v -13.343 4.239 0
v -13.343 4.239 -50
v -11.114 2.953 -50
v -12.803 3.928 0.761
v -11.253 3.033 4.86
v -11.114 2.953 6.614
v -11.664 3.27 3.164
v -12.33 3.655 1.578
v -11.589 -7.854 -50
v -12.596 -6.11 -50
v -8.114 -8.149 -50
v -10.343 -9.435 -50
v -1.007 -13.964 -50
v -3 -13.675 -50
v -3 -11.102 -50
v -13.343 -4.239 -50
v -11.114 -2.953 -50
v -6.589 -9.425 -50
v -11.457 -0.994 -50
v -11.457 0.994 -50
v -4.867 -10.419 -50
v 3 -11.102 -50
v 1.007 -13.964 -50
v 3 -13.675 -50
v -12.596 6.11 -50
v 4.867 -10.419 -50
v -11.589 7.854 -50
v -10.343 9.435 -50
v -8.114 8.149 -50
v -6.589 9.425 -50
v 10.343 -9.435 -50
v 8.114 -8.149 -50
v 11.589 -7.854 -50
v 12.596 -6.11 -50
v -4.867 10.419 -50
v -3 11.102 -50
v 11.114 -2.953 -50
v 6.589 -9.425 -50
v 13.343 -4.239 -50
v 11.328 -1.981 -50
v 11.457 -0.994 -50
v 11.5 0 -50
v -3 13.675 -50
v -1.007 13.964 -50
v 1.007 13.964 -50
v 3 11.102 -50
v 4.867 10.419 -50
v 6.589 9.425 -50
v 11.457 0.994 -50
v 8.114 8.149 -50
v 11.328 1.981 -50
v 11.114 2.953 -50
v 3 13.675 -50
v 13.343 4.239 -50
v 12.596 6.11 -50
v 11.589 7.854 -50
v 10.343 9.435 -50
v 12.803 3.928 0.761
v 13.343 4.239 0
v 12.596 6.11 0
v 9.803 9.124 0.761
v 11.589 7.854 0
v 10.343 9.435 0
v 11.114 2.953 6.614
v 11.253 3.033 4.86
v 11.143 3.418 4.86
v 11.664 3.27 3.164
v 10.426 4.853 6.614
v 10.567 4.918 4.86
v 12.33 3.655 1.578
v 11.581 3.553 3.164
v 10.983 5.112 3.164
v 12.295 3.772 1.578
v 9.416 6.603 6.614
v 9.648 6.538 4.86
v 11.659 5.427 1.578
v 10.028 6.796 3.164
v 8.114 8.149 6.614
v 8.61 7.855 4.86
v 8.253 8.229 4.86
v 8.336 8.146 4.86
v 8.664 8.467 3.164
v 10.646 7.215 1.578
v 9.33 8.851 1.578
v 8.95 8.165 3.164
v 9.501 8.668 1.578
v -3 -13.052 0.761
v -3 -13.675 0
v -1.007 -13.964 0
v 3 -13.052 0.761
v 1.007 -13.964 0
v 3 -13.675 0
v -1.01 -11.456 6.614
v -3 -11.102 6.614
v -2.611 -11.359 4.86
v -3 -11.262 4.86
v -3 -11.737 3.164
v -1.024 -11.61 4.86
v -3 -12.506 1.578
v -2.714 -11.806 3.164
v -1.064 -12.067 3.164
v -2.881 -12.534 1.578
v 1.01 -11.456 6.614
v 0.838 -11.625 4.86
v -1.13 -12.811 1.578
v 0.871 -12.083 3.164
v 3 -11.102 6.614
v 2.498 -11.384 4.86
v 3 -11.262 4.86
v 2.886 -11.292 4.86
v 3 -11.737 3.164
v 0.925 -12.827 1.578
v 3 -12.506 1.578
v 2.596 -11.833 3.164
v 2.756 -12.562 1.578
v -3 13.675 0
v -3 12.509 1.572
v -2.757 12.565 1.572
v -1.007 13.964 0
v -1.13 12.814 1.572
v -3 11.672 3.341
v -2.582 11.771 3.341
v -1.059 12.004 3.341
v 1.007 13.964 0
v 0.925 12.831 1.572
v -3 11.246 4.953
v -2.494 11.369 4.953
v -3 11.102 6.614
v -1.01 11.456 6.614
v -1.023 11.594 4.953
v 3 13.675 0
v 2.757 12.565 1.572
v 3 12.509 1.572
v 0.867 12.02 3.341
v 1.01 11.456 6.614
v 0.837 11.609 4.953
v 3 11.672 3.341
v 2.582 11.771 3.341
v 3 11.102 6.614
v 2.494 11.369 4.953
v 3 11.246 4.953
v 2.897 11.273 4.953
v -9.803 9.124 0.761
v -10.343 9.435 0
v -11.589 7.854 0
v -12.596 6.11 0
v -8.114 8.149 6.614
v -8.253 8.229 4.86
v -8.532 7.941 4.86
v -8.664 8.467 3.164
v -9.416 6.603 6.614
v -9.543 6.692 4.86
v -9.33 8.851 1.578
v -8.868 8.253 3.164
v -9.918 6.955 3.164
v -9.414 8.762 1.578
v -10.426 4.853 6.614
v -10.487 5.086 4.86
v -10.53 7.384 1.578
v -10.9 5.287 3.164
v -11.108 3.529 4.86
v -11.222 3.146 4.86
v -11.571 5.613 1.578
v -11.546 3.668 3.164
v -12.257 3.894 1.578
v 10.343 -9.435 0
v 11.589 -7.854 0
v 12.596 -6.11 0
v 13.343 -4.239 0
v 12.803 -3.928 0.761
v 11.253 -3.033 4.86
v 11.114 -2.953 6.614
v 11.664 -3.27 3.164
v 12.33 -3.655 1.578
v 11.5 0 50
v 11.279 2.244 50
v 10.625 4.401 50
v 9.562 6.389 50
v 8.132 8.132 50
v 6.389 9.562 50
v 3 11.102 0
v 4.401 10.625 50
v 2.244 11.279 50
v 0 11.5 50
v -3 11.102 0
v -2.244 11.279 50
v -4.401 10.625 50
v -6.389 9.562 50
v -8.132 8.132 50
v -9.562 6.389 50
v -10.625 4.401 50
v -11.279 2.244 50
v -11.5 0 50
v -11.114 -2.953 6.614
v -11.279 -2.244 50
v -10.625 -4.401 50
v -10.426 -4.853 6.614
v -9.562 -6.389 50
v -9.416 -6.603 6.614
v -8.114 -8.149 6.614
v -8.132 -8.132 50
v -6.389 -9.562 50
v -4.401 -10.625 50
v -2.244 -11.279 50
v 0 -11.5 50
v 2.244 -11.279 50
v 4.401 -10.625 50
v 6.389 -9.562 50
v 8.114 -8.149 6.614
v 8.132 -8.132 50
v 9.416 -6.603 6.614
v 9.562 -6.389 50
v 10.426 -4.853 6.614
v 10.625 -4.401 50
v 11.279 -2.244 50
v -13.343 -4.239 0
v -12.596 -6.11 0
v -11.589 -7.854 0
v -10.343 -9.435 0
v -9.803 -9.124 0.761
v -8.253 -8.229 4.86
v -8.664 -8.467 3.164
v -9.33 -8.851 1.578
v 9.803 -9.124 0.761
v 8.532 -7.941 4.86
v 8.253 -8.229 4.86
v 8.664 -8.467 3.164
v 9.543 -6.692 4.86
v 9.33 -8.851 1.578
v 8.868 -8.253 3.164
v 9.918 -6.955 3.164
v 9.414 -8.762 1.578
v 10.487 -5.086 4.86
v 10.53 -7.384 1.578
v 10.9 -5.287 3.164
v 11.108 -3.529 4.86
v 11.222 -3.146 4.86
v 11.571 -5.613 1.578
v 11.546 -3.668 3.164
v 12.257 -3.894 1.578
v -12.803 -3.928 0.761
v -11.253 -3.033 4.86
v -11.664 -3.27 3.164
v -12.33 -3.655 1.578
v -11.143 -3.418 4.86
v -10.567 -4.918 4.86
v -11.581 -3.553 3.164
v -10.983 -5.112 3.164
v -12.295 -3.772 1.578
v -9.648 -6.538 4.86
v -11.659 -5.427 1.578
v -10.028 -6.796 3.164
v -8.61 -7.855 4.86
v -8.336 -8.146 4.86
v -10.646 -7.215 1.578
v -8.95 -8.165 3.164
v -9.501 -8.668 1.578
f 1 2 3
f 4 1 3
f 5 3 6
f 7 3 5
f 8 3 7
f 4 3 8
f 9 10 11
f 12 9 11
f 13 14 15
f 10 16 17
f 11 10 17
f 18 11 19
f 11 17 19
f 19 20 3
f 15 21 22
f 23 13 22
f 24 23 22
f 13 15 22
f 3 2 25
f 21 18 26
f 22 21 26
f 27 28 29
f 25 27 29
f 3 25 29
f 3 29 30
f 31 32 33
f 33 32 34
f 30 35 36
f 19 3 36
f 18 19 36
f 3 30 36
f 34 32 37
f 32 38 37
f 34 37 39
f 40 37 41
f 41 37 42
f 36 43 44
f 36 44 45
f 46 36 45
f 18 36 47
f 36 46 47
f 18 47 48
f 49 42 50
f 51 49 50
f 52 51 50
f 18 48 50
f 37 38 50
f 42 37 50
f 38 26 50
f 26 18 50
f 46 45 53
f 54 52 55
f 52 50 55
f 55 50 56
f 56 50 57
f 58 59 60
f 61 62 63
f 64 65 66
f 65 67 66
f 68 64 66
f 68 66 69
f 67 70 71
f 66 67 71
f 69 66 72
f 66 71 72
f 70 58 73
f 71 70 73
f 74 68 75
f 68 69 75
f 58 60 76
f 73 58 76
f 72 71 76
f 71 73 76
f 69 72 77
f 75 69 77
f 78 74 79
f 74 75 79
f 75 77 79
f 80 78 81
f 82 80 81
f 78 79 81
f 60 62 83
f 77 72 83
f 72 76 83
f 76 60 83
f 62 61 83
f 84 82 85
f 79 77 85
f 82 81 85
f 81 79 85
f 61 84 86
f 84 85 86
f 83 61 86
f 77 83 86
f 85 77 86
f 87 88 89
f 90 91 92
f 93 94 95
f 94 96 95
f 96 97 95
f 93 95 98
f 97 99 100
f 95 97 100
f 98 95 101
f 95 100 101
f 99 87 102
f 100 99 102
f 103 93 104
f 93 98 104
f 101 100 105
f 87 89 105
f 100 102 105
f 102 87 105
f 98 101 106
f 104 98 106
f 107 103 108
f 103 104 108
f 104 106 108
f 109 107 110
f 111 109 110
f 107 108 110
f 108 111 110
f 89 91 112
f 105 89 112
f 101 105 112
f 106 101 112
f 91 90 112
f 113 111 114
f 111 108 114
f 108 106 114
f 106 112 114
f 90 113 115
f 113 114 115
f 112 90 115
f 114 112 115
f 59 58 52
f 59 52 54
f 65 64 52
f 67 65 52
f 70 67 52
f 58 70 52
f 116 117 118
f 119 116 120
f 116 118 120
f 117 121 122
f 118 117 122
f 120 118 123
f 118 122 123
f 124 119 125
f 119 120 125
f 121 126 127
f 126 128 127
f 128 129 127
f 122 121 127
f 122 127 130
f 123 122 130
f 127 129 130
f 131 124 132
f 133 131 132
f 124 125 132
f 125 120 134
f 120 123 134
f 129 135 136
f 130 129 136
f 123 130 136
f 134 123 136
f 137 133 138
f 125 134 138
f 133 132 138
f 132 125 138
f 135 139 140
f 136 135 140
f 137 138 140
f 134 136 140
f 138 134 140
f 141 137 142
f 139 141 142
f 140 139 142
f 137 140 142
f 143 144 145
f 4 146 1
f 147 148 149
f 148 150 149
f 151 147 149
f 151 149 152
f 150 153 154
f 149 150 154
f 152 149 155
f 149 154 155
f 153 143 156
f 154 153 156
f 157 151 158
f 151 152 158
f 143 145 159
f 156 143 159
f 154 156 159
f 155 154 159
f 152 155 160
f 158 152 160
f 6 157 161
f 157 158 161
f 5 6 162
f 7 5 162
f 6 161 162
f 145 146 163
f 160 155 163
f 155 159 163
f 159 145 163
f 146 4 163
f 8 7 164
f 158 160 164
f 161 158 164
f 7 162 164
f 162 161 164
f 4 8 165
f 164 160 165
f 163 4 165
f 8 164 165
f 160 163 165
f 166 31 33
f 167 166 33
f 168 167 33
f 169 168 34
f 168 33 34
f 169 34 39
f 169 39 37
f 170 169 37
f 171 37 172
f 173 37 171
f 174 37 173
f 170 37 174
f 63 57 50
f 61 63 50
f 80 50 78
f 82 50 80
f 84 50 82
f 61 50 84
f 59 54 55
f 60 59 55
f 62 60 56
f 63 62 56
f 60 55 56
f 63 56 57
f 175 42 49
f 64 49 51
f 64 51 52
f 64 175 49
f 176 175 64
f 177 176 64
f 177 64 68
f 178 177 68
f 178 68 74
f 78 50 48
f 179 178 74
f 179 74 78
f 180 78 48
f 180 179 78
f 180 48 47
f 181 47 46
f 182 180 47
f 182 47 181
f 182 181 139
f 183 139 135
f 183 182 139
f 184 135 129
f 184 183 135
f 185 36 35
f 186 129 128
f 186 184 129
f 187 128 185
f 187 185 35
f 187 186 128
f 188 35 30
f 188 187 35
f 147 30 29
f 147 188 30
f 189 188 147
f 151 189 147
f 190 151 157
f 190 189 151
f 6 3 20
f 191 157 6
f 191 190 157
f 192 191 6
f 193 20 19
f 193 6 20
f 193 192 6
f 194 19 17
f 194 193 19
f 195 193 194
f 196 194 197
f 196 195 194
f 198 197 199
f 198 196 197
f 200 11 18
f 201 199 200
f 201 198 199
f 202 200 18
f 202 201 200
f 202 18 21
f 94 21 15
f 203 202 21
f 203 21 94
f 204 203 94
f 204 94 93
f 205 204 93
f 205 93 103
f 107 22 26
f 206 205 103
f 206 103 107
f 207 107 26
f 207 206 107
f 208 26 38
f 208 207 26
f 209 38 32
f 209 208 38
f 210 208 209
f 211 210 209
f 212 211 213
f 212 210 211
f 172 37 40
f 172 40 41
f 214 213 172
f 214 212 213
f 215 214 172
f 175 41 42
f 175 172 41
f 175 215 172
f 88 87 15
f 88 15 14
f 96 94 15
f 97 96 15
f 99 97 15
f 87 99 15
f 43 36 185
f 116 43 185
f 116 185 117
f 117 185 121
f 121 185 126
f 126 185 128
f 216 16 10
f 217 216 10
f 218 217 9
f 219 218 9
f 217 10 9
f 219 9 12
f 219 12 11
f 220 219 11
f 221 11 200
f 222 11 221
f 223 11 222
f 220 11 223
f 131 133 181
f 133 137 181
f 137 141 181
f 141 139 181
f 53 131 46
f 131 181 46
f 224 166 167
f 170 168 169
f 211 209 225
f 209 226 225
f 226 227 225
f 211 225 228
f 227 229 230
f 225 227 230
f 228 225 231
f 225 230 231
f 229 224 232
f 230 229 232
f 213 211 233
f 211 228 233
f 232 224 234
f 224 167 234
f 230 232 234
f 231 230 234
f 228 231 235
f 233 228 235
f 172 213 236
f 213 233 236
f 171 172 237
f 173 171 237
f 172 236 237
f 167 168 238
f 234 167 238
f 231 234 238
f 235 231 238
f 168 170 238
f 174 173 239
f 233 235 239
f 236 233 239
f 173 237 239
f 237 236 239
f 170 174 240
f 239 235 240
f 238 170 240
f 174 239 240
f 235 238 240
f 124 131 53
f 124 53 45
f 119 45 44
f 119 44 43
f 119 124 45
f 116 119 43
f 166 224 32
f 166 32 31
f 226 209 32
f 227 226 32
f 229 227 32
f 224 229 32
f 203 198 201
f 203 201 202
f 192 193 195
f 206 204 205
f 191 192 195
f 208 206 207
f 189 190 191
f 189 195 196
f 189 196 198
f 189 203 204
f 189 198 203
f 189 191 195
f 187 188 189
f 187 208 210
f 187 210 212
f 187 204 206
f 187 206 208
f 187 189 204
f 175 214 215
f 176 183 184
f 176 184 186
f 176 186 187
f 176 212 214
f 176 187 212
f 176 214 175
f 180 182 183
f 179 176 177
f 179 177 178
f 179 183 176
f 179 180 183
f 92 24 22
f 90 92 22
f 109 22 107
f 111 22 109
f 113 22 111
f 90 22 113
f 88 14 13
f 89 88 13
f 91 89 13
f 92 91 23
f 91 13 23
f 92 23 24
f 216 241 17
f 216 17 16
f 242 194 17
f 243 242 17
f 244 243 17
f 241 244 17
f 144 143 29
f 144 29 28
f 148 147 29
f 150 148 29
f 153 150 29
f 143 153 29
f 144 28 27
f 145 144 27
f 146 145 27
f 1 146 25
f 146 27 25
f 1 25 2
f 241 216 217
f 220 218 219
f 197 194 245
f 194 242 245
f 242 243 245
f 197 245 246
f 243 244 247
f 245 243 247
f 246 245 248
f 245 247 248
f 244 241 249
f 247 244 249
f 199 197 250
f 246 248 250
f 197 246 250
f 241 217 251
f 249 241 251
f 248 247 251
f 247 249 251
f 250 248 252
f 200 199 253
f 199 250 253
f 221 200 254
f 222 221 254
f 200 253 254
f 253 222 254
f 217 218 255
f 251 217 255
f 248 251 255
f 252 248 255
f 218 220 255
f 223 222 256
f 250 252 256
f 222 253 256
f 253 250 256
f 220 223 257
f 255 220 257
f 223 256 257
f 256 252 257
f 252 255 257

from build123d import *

# Parameters (mm, degrees)
SKETCH1_R           = 11.5
SHAFT_DEPTH         = 50
BOSS_EXTRUDE2_DEPTH = 50
FILLET1_R           = 10
CIRPATTERN1_START   = -50
CIRPATTERN1_DEPTH   = 56.614378378


with BuildPart() as part:
    # Sketch1 → Shaft (new, symmetric)
    with BuildSketch(Plane.XY):
        Circle(SKETCH1_R)
    extrude(amount=SHAFT_DEPTH, both=True)

    # Sketch2 → Boss-Extrude2 (add)
    with BuildSketch(Plane.XY):
        with BuildLine():
            Line((3, 11.101801656), (3, 13.674794331))
            ThreePointArc((3, 13.674794331), (0, 14), (-3, 13.674794331))
            Line((-3, 13.674794331), (-3, 11.101801656))
            ThreePointArc((-3, 11.101801656), (0, 11.5), (3, 11.101801656))
        make_face()
    extrude(amount=-BOSS_EXTRUDE2_DEPTH)

    # Fillet1
    # the kernel refuses this fillet: 10 mm, written as the material it adds along each edge
    with BuildSketch(Plane(origin=(0, 0, 0), x_dir=(-0.9914186895468253, -0.13072483320798547, 0), z_dir=(0.13072483320798547, -0.9914186895468253, 0))) as fillet1_piece_1_section:
        with BuildLine():
            CenterArc((21.5, -6.614378278), FILLET1_R, 138.590377891, 41.409622109)
            Line((14, 0), (13.85, 0.132287566))
            ThreePointArc((13.85, 0.132287566), (12.75, 0.2), (11.5, 0.2))
            Line((11.5, 0.2), (11.3, 0))
            Line((11.3, 0), (11.3, -6.614378278))
            Line((11.3, -6.614378278), (11.5, -6.614378278))
        make_face()
    fillet1_piece_1 = revolve(axis=Axis((0, 0, 0), (0, 0, -1)), revolution_arc=195.022959301, mode=Mode.PRIVATE)
    fillet1_piece_1 = split(fillet1_piece_1, bisect_by=Plane(origin=(-3, 0, 0), z_dir=(1, 0, 0)), keep=Keep.TOP, mode=Mode.PRIVATE)
    fillet1_piece_1 = split(fillet1_piece_1, bisect_by=Plane(origin=(3, 0, 0), z_dir=(-1, 0, 0)), keep=Keep.TOP, mode=Mode.PRIVATE)
    add(fillet1_piece_1)

    # CirPattern1: read off the stored shape, not the designer's step
    # CirPattern1 outline → CirPattern1 (add)
    with BuildSketch(Plane.XY.offset(CIRPATTERN1_START)):
        with BuildLine():
            Line((11.114442262, 2.952824616), (13.342719282, 4.239320954))
            ThreePointArc((13.342719282, 4.239320954), (12.124355653, 7), (10.342719282, 9.435473377))
            Line((10.342719282, 9.435473377), (8.114442262, 8.148977039))
            ThreePointArc((8.114442262, 8.148977039), (9.959292144, 5.75), (11.114442262, 2.952824616))
        make_face()
        with BuildLine():
            ThreePointArc((-11.114442262, 2.952824616), (-9.959292144, 5.75), (-8.114442262, 8.148977039))
            Line((-8.114442262, 8.148977039), (-10.342719282, 9.435473377))
            ThreePointArc((-10.342719282, 9.435473377), (-12.124355653, 7), (-13.342719282, 4.239320954))
            Line((-13.342719282, 4.239320954), (-11.114442262, 2.952824616))
        make_face()
        with BuildLine():
            Line((13.342719282, -4.239320954), (11.114442262, -2.952824616))
            ThreePointArc((11.114442262, -2.952824616), (9.959292144, -5.75), (8.114442262, -8.148977039))
            Line((8.114442262, -8.148977039), (10.342719282, -9.435473377))
            ThreePointArc((10.342719282, -9.435473377), (12.124355653, -7), (13.342719282, -4.239320954))
        make_face()
        with BuildLine():
            ThreePointArc((-8.114442262, -8.148977039), (-9.959292144, -5.75), (-11.114442262, -2.952824616))
            Line((-11.114442262, -2.952824616), (-13.342719282, -4.239320954))
            ThreePointArc((-13.342719282, -4.239320954), (-12.124355653, -7), (-10.342719282, -9.435473377))
            Line((-10.342719282, -9.435473377), (-8.114442262, -8.148977039))
        make_face()
        with BuildLine():
            Line((3, -13.674794331), (3, -11.101801656))
            ThreePointArc((3, -11.101801656), (0, -11.5), (-3, -11.101801656))
            Line((-3, -11.101801656), (-3, -13.674794331))
            ThreePointArc((-3, -13.674794331), (0, -14), (3, -13.674794331))
        make_face()
    extrude(amount=CIRPATTERN1_DEPTH)

    # CirPattern1 2 outline → CirPattern1 2 (revolve, cut)
    with BuildSketch(Plane.XZ):
        with BuildLine():
            ThreePointArc((11.5, 6.614378278), (12.145856533, 3.078844372), (14, 0))
            Line((14, 0), (14, 6.614378378))
            Line((14, 6.614378378), (11.5, 6.614378278))
        make_face()
    revolve(axis=Axis((0, 0, 0), (0, 0, 1)), mode=Mode.SUBTRACT)


solid = part.part
